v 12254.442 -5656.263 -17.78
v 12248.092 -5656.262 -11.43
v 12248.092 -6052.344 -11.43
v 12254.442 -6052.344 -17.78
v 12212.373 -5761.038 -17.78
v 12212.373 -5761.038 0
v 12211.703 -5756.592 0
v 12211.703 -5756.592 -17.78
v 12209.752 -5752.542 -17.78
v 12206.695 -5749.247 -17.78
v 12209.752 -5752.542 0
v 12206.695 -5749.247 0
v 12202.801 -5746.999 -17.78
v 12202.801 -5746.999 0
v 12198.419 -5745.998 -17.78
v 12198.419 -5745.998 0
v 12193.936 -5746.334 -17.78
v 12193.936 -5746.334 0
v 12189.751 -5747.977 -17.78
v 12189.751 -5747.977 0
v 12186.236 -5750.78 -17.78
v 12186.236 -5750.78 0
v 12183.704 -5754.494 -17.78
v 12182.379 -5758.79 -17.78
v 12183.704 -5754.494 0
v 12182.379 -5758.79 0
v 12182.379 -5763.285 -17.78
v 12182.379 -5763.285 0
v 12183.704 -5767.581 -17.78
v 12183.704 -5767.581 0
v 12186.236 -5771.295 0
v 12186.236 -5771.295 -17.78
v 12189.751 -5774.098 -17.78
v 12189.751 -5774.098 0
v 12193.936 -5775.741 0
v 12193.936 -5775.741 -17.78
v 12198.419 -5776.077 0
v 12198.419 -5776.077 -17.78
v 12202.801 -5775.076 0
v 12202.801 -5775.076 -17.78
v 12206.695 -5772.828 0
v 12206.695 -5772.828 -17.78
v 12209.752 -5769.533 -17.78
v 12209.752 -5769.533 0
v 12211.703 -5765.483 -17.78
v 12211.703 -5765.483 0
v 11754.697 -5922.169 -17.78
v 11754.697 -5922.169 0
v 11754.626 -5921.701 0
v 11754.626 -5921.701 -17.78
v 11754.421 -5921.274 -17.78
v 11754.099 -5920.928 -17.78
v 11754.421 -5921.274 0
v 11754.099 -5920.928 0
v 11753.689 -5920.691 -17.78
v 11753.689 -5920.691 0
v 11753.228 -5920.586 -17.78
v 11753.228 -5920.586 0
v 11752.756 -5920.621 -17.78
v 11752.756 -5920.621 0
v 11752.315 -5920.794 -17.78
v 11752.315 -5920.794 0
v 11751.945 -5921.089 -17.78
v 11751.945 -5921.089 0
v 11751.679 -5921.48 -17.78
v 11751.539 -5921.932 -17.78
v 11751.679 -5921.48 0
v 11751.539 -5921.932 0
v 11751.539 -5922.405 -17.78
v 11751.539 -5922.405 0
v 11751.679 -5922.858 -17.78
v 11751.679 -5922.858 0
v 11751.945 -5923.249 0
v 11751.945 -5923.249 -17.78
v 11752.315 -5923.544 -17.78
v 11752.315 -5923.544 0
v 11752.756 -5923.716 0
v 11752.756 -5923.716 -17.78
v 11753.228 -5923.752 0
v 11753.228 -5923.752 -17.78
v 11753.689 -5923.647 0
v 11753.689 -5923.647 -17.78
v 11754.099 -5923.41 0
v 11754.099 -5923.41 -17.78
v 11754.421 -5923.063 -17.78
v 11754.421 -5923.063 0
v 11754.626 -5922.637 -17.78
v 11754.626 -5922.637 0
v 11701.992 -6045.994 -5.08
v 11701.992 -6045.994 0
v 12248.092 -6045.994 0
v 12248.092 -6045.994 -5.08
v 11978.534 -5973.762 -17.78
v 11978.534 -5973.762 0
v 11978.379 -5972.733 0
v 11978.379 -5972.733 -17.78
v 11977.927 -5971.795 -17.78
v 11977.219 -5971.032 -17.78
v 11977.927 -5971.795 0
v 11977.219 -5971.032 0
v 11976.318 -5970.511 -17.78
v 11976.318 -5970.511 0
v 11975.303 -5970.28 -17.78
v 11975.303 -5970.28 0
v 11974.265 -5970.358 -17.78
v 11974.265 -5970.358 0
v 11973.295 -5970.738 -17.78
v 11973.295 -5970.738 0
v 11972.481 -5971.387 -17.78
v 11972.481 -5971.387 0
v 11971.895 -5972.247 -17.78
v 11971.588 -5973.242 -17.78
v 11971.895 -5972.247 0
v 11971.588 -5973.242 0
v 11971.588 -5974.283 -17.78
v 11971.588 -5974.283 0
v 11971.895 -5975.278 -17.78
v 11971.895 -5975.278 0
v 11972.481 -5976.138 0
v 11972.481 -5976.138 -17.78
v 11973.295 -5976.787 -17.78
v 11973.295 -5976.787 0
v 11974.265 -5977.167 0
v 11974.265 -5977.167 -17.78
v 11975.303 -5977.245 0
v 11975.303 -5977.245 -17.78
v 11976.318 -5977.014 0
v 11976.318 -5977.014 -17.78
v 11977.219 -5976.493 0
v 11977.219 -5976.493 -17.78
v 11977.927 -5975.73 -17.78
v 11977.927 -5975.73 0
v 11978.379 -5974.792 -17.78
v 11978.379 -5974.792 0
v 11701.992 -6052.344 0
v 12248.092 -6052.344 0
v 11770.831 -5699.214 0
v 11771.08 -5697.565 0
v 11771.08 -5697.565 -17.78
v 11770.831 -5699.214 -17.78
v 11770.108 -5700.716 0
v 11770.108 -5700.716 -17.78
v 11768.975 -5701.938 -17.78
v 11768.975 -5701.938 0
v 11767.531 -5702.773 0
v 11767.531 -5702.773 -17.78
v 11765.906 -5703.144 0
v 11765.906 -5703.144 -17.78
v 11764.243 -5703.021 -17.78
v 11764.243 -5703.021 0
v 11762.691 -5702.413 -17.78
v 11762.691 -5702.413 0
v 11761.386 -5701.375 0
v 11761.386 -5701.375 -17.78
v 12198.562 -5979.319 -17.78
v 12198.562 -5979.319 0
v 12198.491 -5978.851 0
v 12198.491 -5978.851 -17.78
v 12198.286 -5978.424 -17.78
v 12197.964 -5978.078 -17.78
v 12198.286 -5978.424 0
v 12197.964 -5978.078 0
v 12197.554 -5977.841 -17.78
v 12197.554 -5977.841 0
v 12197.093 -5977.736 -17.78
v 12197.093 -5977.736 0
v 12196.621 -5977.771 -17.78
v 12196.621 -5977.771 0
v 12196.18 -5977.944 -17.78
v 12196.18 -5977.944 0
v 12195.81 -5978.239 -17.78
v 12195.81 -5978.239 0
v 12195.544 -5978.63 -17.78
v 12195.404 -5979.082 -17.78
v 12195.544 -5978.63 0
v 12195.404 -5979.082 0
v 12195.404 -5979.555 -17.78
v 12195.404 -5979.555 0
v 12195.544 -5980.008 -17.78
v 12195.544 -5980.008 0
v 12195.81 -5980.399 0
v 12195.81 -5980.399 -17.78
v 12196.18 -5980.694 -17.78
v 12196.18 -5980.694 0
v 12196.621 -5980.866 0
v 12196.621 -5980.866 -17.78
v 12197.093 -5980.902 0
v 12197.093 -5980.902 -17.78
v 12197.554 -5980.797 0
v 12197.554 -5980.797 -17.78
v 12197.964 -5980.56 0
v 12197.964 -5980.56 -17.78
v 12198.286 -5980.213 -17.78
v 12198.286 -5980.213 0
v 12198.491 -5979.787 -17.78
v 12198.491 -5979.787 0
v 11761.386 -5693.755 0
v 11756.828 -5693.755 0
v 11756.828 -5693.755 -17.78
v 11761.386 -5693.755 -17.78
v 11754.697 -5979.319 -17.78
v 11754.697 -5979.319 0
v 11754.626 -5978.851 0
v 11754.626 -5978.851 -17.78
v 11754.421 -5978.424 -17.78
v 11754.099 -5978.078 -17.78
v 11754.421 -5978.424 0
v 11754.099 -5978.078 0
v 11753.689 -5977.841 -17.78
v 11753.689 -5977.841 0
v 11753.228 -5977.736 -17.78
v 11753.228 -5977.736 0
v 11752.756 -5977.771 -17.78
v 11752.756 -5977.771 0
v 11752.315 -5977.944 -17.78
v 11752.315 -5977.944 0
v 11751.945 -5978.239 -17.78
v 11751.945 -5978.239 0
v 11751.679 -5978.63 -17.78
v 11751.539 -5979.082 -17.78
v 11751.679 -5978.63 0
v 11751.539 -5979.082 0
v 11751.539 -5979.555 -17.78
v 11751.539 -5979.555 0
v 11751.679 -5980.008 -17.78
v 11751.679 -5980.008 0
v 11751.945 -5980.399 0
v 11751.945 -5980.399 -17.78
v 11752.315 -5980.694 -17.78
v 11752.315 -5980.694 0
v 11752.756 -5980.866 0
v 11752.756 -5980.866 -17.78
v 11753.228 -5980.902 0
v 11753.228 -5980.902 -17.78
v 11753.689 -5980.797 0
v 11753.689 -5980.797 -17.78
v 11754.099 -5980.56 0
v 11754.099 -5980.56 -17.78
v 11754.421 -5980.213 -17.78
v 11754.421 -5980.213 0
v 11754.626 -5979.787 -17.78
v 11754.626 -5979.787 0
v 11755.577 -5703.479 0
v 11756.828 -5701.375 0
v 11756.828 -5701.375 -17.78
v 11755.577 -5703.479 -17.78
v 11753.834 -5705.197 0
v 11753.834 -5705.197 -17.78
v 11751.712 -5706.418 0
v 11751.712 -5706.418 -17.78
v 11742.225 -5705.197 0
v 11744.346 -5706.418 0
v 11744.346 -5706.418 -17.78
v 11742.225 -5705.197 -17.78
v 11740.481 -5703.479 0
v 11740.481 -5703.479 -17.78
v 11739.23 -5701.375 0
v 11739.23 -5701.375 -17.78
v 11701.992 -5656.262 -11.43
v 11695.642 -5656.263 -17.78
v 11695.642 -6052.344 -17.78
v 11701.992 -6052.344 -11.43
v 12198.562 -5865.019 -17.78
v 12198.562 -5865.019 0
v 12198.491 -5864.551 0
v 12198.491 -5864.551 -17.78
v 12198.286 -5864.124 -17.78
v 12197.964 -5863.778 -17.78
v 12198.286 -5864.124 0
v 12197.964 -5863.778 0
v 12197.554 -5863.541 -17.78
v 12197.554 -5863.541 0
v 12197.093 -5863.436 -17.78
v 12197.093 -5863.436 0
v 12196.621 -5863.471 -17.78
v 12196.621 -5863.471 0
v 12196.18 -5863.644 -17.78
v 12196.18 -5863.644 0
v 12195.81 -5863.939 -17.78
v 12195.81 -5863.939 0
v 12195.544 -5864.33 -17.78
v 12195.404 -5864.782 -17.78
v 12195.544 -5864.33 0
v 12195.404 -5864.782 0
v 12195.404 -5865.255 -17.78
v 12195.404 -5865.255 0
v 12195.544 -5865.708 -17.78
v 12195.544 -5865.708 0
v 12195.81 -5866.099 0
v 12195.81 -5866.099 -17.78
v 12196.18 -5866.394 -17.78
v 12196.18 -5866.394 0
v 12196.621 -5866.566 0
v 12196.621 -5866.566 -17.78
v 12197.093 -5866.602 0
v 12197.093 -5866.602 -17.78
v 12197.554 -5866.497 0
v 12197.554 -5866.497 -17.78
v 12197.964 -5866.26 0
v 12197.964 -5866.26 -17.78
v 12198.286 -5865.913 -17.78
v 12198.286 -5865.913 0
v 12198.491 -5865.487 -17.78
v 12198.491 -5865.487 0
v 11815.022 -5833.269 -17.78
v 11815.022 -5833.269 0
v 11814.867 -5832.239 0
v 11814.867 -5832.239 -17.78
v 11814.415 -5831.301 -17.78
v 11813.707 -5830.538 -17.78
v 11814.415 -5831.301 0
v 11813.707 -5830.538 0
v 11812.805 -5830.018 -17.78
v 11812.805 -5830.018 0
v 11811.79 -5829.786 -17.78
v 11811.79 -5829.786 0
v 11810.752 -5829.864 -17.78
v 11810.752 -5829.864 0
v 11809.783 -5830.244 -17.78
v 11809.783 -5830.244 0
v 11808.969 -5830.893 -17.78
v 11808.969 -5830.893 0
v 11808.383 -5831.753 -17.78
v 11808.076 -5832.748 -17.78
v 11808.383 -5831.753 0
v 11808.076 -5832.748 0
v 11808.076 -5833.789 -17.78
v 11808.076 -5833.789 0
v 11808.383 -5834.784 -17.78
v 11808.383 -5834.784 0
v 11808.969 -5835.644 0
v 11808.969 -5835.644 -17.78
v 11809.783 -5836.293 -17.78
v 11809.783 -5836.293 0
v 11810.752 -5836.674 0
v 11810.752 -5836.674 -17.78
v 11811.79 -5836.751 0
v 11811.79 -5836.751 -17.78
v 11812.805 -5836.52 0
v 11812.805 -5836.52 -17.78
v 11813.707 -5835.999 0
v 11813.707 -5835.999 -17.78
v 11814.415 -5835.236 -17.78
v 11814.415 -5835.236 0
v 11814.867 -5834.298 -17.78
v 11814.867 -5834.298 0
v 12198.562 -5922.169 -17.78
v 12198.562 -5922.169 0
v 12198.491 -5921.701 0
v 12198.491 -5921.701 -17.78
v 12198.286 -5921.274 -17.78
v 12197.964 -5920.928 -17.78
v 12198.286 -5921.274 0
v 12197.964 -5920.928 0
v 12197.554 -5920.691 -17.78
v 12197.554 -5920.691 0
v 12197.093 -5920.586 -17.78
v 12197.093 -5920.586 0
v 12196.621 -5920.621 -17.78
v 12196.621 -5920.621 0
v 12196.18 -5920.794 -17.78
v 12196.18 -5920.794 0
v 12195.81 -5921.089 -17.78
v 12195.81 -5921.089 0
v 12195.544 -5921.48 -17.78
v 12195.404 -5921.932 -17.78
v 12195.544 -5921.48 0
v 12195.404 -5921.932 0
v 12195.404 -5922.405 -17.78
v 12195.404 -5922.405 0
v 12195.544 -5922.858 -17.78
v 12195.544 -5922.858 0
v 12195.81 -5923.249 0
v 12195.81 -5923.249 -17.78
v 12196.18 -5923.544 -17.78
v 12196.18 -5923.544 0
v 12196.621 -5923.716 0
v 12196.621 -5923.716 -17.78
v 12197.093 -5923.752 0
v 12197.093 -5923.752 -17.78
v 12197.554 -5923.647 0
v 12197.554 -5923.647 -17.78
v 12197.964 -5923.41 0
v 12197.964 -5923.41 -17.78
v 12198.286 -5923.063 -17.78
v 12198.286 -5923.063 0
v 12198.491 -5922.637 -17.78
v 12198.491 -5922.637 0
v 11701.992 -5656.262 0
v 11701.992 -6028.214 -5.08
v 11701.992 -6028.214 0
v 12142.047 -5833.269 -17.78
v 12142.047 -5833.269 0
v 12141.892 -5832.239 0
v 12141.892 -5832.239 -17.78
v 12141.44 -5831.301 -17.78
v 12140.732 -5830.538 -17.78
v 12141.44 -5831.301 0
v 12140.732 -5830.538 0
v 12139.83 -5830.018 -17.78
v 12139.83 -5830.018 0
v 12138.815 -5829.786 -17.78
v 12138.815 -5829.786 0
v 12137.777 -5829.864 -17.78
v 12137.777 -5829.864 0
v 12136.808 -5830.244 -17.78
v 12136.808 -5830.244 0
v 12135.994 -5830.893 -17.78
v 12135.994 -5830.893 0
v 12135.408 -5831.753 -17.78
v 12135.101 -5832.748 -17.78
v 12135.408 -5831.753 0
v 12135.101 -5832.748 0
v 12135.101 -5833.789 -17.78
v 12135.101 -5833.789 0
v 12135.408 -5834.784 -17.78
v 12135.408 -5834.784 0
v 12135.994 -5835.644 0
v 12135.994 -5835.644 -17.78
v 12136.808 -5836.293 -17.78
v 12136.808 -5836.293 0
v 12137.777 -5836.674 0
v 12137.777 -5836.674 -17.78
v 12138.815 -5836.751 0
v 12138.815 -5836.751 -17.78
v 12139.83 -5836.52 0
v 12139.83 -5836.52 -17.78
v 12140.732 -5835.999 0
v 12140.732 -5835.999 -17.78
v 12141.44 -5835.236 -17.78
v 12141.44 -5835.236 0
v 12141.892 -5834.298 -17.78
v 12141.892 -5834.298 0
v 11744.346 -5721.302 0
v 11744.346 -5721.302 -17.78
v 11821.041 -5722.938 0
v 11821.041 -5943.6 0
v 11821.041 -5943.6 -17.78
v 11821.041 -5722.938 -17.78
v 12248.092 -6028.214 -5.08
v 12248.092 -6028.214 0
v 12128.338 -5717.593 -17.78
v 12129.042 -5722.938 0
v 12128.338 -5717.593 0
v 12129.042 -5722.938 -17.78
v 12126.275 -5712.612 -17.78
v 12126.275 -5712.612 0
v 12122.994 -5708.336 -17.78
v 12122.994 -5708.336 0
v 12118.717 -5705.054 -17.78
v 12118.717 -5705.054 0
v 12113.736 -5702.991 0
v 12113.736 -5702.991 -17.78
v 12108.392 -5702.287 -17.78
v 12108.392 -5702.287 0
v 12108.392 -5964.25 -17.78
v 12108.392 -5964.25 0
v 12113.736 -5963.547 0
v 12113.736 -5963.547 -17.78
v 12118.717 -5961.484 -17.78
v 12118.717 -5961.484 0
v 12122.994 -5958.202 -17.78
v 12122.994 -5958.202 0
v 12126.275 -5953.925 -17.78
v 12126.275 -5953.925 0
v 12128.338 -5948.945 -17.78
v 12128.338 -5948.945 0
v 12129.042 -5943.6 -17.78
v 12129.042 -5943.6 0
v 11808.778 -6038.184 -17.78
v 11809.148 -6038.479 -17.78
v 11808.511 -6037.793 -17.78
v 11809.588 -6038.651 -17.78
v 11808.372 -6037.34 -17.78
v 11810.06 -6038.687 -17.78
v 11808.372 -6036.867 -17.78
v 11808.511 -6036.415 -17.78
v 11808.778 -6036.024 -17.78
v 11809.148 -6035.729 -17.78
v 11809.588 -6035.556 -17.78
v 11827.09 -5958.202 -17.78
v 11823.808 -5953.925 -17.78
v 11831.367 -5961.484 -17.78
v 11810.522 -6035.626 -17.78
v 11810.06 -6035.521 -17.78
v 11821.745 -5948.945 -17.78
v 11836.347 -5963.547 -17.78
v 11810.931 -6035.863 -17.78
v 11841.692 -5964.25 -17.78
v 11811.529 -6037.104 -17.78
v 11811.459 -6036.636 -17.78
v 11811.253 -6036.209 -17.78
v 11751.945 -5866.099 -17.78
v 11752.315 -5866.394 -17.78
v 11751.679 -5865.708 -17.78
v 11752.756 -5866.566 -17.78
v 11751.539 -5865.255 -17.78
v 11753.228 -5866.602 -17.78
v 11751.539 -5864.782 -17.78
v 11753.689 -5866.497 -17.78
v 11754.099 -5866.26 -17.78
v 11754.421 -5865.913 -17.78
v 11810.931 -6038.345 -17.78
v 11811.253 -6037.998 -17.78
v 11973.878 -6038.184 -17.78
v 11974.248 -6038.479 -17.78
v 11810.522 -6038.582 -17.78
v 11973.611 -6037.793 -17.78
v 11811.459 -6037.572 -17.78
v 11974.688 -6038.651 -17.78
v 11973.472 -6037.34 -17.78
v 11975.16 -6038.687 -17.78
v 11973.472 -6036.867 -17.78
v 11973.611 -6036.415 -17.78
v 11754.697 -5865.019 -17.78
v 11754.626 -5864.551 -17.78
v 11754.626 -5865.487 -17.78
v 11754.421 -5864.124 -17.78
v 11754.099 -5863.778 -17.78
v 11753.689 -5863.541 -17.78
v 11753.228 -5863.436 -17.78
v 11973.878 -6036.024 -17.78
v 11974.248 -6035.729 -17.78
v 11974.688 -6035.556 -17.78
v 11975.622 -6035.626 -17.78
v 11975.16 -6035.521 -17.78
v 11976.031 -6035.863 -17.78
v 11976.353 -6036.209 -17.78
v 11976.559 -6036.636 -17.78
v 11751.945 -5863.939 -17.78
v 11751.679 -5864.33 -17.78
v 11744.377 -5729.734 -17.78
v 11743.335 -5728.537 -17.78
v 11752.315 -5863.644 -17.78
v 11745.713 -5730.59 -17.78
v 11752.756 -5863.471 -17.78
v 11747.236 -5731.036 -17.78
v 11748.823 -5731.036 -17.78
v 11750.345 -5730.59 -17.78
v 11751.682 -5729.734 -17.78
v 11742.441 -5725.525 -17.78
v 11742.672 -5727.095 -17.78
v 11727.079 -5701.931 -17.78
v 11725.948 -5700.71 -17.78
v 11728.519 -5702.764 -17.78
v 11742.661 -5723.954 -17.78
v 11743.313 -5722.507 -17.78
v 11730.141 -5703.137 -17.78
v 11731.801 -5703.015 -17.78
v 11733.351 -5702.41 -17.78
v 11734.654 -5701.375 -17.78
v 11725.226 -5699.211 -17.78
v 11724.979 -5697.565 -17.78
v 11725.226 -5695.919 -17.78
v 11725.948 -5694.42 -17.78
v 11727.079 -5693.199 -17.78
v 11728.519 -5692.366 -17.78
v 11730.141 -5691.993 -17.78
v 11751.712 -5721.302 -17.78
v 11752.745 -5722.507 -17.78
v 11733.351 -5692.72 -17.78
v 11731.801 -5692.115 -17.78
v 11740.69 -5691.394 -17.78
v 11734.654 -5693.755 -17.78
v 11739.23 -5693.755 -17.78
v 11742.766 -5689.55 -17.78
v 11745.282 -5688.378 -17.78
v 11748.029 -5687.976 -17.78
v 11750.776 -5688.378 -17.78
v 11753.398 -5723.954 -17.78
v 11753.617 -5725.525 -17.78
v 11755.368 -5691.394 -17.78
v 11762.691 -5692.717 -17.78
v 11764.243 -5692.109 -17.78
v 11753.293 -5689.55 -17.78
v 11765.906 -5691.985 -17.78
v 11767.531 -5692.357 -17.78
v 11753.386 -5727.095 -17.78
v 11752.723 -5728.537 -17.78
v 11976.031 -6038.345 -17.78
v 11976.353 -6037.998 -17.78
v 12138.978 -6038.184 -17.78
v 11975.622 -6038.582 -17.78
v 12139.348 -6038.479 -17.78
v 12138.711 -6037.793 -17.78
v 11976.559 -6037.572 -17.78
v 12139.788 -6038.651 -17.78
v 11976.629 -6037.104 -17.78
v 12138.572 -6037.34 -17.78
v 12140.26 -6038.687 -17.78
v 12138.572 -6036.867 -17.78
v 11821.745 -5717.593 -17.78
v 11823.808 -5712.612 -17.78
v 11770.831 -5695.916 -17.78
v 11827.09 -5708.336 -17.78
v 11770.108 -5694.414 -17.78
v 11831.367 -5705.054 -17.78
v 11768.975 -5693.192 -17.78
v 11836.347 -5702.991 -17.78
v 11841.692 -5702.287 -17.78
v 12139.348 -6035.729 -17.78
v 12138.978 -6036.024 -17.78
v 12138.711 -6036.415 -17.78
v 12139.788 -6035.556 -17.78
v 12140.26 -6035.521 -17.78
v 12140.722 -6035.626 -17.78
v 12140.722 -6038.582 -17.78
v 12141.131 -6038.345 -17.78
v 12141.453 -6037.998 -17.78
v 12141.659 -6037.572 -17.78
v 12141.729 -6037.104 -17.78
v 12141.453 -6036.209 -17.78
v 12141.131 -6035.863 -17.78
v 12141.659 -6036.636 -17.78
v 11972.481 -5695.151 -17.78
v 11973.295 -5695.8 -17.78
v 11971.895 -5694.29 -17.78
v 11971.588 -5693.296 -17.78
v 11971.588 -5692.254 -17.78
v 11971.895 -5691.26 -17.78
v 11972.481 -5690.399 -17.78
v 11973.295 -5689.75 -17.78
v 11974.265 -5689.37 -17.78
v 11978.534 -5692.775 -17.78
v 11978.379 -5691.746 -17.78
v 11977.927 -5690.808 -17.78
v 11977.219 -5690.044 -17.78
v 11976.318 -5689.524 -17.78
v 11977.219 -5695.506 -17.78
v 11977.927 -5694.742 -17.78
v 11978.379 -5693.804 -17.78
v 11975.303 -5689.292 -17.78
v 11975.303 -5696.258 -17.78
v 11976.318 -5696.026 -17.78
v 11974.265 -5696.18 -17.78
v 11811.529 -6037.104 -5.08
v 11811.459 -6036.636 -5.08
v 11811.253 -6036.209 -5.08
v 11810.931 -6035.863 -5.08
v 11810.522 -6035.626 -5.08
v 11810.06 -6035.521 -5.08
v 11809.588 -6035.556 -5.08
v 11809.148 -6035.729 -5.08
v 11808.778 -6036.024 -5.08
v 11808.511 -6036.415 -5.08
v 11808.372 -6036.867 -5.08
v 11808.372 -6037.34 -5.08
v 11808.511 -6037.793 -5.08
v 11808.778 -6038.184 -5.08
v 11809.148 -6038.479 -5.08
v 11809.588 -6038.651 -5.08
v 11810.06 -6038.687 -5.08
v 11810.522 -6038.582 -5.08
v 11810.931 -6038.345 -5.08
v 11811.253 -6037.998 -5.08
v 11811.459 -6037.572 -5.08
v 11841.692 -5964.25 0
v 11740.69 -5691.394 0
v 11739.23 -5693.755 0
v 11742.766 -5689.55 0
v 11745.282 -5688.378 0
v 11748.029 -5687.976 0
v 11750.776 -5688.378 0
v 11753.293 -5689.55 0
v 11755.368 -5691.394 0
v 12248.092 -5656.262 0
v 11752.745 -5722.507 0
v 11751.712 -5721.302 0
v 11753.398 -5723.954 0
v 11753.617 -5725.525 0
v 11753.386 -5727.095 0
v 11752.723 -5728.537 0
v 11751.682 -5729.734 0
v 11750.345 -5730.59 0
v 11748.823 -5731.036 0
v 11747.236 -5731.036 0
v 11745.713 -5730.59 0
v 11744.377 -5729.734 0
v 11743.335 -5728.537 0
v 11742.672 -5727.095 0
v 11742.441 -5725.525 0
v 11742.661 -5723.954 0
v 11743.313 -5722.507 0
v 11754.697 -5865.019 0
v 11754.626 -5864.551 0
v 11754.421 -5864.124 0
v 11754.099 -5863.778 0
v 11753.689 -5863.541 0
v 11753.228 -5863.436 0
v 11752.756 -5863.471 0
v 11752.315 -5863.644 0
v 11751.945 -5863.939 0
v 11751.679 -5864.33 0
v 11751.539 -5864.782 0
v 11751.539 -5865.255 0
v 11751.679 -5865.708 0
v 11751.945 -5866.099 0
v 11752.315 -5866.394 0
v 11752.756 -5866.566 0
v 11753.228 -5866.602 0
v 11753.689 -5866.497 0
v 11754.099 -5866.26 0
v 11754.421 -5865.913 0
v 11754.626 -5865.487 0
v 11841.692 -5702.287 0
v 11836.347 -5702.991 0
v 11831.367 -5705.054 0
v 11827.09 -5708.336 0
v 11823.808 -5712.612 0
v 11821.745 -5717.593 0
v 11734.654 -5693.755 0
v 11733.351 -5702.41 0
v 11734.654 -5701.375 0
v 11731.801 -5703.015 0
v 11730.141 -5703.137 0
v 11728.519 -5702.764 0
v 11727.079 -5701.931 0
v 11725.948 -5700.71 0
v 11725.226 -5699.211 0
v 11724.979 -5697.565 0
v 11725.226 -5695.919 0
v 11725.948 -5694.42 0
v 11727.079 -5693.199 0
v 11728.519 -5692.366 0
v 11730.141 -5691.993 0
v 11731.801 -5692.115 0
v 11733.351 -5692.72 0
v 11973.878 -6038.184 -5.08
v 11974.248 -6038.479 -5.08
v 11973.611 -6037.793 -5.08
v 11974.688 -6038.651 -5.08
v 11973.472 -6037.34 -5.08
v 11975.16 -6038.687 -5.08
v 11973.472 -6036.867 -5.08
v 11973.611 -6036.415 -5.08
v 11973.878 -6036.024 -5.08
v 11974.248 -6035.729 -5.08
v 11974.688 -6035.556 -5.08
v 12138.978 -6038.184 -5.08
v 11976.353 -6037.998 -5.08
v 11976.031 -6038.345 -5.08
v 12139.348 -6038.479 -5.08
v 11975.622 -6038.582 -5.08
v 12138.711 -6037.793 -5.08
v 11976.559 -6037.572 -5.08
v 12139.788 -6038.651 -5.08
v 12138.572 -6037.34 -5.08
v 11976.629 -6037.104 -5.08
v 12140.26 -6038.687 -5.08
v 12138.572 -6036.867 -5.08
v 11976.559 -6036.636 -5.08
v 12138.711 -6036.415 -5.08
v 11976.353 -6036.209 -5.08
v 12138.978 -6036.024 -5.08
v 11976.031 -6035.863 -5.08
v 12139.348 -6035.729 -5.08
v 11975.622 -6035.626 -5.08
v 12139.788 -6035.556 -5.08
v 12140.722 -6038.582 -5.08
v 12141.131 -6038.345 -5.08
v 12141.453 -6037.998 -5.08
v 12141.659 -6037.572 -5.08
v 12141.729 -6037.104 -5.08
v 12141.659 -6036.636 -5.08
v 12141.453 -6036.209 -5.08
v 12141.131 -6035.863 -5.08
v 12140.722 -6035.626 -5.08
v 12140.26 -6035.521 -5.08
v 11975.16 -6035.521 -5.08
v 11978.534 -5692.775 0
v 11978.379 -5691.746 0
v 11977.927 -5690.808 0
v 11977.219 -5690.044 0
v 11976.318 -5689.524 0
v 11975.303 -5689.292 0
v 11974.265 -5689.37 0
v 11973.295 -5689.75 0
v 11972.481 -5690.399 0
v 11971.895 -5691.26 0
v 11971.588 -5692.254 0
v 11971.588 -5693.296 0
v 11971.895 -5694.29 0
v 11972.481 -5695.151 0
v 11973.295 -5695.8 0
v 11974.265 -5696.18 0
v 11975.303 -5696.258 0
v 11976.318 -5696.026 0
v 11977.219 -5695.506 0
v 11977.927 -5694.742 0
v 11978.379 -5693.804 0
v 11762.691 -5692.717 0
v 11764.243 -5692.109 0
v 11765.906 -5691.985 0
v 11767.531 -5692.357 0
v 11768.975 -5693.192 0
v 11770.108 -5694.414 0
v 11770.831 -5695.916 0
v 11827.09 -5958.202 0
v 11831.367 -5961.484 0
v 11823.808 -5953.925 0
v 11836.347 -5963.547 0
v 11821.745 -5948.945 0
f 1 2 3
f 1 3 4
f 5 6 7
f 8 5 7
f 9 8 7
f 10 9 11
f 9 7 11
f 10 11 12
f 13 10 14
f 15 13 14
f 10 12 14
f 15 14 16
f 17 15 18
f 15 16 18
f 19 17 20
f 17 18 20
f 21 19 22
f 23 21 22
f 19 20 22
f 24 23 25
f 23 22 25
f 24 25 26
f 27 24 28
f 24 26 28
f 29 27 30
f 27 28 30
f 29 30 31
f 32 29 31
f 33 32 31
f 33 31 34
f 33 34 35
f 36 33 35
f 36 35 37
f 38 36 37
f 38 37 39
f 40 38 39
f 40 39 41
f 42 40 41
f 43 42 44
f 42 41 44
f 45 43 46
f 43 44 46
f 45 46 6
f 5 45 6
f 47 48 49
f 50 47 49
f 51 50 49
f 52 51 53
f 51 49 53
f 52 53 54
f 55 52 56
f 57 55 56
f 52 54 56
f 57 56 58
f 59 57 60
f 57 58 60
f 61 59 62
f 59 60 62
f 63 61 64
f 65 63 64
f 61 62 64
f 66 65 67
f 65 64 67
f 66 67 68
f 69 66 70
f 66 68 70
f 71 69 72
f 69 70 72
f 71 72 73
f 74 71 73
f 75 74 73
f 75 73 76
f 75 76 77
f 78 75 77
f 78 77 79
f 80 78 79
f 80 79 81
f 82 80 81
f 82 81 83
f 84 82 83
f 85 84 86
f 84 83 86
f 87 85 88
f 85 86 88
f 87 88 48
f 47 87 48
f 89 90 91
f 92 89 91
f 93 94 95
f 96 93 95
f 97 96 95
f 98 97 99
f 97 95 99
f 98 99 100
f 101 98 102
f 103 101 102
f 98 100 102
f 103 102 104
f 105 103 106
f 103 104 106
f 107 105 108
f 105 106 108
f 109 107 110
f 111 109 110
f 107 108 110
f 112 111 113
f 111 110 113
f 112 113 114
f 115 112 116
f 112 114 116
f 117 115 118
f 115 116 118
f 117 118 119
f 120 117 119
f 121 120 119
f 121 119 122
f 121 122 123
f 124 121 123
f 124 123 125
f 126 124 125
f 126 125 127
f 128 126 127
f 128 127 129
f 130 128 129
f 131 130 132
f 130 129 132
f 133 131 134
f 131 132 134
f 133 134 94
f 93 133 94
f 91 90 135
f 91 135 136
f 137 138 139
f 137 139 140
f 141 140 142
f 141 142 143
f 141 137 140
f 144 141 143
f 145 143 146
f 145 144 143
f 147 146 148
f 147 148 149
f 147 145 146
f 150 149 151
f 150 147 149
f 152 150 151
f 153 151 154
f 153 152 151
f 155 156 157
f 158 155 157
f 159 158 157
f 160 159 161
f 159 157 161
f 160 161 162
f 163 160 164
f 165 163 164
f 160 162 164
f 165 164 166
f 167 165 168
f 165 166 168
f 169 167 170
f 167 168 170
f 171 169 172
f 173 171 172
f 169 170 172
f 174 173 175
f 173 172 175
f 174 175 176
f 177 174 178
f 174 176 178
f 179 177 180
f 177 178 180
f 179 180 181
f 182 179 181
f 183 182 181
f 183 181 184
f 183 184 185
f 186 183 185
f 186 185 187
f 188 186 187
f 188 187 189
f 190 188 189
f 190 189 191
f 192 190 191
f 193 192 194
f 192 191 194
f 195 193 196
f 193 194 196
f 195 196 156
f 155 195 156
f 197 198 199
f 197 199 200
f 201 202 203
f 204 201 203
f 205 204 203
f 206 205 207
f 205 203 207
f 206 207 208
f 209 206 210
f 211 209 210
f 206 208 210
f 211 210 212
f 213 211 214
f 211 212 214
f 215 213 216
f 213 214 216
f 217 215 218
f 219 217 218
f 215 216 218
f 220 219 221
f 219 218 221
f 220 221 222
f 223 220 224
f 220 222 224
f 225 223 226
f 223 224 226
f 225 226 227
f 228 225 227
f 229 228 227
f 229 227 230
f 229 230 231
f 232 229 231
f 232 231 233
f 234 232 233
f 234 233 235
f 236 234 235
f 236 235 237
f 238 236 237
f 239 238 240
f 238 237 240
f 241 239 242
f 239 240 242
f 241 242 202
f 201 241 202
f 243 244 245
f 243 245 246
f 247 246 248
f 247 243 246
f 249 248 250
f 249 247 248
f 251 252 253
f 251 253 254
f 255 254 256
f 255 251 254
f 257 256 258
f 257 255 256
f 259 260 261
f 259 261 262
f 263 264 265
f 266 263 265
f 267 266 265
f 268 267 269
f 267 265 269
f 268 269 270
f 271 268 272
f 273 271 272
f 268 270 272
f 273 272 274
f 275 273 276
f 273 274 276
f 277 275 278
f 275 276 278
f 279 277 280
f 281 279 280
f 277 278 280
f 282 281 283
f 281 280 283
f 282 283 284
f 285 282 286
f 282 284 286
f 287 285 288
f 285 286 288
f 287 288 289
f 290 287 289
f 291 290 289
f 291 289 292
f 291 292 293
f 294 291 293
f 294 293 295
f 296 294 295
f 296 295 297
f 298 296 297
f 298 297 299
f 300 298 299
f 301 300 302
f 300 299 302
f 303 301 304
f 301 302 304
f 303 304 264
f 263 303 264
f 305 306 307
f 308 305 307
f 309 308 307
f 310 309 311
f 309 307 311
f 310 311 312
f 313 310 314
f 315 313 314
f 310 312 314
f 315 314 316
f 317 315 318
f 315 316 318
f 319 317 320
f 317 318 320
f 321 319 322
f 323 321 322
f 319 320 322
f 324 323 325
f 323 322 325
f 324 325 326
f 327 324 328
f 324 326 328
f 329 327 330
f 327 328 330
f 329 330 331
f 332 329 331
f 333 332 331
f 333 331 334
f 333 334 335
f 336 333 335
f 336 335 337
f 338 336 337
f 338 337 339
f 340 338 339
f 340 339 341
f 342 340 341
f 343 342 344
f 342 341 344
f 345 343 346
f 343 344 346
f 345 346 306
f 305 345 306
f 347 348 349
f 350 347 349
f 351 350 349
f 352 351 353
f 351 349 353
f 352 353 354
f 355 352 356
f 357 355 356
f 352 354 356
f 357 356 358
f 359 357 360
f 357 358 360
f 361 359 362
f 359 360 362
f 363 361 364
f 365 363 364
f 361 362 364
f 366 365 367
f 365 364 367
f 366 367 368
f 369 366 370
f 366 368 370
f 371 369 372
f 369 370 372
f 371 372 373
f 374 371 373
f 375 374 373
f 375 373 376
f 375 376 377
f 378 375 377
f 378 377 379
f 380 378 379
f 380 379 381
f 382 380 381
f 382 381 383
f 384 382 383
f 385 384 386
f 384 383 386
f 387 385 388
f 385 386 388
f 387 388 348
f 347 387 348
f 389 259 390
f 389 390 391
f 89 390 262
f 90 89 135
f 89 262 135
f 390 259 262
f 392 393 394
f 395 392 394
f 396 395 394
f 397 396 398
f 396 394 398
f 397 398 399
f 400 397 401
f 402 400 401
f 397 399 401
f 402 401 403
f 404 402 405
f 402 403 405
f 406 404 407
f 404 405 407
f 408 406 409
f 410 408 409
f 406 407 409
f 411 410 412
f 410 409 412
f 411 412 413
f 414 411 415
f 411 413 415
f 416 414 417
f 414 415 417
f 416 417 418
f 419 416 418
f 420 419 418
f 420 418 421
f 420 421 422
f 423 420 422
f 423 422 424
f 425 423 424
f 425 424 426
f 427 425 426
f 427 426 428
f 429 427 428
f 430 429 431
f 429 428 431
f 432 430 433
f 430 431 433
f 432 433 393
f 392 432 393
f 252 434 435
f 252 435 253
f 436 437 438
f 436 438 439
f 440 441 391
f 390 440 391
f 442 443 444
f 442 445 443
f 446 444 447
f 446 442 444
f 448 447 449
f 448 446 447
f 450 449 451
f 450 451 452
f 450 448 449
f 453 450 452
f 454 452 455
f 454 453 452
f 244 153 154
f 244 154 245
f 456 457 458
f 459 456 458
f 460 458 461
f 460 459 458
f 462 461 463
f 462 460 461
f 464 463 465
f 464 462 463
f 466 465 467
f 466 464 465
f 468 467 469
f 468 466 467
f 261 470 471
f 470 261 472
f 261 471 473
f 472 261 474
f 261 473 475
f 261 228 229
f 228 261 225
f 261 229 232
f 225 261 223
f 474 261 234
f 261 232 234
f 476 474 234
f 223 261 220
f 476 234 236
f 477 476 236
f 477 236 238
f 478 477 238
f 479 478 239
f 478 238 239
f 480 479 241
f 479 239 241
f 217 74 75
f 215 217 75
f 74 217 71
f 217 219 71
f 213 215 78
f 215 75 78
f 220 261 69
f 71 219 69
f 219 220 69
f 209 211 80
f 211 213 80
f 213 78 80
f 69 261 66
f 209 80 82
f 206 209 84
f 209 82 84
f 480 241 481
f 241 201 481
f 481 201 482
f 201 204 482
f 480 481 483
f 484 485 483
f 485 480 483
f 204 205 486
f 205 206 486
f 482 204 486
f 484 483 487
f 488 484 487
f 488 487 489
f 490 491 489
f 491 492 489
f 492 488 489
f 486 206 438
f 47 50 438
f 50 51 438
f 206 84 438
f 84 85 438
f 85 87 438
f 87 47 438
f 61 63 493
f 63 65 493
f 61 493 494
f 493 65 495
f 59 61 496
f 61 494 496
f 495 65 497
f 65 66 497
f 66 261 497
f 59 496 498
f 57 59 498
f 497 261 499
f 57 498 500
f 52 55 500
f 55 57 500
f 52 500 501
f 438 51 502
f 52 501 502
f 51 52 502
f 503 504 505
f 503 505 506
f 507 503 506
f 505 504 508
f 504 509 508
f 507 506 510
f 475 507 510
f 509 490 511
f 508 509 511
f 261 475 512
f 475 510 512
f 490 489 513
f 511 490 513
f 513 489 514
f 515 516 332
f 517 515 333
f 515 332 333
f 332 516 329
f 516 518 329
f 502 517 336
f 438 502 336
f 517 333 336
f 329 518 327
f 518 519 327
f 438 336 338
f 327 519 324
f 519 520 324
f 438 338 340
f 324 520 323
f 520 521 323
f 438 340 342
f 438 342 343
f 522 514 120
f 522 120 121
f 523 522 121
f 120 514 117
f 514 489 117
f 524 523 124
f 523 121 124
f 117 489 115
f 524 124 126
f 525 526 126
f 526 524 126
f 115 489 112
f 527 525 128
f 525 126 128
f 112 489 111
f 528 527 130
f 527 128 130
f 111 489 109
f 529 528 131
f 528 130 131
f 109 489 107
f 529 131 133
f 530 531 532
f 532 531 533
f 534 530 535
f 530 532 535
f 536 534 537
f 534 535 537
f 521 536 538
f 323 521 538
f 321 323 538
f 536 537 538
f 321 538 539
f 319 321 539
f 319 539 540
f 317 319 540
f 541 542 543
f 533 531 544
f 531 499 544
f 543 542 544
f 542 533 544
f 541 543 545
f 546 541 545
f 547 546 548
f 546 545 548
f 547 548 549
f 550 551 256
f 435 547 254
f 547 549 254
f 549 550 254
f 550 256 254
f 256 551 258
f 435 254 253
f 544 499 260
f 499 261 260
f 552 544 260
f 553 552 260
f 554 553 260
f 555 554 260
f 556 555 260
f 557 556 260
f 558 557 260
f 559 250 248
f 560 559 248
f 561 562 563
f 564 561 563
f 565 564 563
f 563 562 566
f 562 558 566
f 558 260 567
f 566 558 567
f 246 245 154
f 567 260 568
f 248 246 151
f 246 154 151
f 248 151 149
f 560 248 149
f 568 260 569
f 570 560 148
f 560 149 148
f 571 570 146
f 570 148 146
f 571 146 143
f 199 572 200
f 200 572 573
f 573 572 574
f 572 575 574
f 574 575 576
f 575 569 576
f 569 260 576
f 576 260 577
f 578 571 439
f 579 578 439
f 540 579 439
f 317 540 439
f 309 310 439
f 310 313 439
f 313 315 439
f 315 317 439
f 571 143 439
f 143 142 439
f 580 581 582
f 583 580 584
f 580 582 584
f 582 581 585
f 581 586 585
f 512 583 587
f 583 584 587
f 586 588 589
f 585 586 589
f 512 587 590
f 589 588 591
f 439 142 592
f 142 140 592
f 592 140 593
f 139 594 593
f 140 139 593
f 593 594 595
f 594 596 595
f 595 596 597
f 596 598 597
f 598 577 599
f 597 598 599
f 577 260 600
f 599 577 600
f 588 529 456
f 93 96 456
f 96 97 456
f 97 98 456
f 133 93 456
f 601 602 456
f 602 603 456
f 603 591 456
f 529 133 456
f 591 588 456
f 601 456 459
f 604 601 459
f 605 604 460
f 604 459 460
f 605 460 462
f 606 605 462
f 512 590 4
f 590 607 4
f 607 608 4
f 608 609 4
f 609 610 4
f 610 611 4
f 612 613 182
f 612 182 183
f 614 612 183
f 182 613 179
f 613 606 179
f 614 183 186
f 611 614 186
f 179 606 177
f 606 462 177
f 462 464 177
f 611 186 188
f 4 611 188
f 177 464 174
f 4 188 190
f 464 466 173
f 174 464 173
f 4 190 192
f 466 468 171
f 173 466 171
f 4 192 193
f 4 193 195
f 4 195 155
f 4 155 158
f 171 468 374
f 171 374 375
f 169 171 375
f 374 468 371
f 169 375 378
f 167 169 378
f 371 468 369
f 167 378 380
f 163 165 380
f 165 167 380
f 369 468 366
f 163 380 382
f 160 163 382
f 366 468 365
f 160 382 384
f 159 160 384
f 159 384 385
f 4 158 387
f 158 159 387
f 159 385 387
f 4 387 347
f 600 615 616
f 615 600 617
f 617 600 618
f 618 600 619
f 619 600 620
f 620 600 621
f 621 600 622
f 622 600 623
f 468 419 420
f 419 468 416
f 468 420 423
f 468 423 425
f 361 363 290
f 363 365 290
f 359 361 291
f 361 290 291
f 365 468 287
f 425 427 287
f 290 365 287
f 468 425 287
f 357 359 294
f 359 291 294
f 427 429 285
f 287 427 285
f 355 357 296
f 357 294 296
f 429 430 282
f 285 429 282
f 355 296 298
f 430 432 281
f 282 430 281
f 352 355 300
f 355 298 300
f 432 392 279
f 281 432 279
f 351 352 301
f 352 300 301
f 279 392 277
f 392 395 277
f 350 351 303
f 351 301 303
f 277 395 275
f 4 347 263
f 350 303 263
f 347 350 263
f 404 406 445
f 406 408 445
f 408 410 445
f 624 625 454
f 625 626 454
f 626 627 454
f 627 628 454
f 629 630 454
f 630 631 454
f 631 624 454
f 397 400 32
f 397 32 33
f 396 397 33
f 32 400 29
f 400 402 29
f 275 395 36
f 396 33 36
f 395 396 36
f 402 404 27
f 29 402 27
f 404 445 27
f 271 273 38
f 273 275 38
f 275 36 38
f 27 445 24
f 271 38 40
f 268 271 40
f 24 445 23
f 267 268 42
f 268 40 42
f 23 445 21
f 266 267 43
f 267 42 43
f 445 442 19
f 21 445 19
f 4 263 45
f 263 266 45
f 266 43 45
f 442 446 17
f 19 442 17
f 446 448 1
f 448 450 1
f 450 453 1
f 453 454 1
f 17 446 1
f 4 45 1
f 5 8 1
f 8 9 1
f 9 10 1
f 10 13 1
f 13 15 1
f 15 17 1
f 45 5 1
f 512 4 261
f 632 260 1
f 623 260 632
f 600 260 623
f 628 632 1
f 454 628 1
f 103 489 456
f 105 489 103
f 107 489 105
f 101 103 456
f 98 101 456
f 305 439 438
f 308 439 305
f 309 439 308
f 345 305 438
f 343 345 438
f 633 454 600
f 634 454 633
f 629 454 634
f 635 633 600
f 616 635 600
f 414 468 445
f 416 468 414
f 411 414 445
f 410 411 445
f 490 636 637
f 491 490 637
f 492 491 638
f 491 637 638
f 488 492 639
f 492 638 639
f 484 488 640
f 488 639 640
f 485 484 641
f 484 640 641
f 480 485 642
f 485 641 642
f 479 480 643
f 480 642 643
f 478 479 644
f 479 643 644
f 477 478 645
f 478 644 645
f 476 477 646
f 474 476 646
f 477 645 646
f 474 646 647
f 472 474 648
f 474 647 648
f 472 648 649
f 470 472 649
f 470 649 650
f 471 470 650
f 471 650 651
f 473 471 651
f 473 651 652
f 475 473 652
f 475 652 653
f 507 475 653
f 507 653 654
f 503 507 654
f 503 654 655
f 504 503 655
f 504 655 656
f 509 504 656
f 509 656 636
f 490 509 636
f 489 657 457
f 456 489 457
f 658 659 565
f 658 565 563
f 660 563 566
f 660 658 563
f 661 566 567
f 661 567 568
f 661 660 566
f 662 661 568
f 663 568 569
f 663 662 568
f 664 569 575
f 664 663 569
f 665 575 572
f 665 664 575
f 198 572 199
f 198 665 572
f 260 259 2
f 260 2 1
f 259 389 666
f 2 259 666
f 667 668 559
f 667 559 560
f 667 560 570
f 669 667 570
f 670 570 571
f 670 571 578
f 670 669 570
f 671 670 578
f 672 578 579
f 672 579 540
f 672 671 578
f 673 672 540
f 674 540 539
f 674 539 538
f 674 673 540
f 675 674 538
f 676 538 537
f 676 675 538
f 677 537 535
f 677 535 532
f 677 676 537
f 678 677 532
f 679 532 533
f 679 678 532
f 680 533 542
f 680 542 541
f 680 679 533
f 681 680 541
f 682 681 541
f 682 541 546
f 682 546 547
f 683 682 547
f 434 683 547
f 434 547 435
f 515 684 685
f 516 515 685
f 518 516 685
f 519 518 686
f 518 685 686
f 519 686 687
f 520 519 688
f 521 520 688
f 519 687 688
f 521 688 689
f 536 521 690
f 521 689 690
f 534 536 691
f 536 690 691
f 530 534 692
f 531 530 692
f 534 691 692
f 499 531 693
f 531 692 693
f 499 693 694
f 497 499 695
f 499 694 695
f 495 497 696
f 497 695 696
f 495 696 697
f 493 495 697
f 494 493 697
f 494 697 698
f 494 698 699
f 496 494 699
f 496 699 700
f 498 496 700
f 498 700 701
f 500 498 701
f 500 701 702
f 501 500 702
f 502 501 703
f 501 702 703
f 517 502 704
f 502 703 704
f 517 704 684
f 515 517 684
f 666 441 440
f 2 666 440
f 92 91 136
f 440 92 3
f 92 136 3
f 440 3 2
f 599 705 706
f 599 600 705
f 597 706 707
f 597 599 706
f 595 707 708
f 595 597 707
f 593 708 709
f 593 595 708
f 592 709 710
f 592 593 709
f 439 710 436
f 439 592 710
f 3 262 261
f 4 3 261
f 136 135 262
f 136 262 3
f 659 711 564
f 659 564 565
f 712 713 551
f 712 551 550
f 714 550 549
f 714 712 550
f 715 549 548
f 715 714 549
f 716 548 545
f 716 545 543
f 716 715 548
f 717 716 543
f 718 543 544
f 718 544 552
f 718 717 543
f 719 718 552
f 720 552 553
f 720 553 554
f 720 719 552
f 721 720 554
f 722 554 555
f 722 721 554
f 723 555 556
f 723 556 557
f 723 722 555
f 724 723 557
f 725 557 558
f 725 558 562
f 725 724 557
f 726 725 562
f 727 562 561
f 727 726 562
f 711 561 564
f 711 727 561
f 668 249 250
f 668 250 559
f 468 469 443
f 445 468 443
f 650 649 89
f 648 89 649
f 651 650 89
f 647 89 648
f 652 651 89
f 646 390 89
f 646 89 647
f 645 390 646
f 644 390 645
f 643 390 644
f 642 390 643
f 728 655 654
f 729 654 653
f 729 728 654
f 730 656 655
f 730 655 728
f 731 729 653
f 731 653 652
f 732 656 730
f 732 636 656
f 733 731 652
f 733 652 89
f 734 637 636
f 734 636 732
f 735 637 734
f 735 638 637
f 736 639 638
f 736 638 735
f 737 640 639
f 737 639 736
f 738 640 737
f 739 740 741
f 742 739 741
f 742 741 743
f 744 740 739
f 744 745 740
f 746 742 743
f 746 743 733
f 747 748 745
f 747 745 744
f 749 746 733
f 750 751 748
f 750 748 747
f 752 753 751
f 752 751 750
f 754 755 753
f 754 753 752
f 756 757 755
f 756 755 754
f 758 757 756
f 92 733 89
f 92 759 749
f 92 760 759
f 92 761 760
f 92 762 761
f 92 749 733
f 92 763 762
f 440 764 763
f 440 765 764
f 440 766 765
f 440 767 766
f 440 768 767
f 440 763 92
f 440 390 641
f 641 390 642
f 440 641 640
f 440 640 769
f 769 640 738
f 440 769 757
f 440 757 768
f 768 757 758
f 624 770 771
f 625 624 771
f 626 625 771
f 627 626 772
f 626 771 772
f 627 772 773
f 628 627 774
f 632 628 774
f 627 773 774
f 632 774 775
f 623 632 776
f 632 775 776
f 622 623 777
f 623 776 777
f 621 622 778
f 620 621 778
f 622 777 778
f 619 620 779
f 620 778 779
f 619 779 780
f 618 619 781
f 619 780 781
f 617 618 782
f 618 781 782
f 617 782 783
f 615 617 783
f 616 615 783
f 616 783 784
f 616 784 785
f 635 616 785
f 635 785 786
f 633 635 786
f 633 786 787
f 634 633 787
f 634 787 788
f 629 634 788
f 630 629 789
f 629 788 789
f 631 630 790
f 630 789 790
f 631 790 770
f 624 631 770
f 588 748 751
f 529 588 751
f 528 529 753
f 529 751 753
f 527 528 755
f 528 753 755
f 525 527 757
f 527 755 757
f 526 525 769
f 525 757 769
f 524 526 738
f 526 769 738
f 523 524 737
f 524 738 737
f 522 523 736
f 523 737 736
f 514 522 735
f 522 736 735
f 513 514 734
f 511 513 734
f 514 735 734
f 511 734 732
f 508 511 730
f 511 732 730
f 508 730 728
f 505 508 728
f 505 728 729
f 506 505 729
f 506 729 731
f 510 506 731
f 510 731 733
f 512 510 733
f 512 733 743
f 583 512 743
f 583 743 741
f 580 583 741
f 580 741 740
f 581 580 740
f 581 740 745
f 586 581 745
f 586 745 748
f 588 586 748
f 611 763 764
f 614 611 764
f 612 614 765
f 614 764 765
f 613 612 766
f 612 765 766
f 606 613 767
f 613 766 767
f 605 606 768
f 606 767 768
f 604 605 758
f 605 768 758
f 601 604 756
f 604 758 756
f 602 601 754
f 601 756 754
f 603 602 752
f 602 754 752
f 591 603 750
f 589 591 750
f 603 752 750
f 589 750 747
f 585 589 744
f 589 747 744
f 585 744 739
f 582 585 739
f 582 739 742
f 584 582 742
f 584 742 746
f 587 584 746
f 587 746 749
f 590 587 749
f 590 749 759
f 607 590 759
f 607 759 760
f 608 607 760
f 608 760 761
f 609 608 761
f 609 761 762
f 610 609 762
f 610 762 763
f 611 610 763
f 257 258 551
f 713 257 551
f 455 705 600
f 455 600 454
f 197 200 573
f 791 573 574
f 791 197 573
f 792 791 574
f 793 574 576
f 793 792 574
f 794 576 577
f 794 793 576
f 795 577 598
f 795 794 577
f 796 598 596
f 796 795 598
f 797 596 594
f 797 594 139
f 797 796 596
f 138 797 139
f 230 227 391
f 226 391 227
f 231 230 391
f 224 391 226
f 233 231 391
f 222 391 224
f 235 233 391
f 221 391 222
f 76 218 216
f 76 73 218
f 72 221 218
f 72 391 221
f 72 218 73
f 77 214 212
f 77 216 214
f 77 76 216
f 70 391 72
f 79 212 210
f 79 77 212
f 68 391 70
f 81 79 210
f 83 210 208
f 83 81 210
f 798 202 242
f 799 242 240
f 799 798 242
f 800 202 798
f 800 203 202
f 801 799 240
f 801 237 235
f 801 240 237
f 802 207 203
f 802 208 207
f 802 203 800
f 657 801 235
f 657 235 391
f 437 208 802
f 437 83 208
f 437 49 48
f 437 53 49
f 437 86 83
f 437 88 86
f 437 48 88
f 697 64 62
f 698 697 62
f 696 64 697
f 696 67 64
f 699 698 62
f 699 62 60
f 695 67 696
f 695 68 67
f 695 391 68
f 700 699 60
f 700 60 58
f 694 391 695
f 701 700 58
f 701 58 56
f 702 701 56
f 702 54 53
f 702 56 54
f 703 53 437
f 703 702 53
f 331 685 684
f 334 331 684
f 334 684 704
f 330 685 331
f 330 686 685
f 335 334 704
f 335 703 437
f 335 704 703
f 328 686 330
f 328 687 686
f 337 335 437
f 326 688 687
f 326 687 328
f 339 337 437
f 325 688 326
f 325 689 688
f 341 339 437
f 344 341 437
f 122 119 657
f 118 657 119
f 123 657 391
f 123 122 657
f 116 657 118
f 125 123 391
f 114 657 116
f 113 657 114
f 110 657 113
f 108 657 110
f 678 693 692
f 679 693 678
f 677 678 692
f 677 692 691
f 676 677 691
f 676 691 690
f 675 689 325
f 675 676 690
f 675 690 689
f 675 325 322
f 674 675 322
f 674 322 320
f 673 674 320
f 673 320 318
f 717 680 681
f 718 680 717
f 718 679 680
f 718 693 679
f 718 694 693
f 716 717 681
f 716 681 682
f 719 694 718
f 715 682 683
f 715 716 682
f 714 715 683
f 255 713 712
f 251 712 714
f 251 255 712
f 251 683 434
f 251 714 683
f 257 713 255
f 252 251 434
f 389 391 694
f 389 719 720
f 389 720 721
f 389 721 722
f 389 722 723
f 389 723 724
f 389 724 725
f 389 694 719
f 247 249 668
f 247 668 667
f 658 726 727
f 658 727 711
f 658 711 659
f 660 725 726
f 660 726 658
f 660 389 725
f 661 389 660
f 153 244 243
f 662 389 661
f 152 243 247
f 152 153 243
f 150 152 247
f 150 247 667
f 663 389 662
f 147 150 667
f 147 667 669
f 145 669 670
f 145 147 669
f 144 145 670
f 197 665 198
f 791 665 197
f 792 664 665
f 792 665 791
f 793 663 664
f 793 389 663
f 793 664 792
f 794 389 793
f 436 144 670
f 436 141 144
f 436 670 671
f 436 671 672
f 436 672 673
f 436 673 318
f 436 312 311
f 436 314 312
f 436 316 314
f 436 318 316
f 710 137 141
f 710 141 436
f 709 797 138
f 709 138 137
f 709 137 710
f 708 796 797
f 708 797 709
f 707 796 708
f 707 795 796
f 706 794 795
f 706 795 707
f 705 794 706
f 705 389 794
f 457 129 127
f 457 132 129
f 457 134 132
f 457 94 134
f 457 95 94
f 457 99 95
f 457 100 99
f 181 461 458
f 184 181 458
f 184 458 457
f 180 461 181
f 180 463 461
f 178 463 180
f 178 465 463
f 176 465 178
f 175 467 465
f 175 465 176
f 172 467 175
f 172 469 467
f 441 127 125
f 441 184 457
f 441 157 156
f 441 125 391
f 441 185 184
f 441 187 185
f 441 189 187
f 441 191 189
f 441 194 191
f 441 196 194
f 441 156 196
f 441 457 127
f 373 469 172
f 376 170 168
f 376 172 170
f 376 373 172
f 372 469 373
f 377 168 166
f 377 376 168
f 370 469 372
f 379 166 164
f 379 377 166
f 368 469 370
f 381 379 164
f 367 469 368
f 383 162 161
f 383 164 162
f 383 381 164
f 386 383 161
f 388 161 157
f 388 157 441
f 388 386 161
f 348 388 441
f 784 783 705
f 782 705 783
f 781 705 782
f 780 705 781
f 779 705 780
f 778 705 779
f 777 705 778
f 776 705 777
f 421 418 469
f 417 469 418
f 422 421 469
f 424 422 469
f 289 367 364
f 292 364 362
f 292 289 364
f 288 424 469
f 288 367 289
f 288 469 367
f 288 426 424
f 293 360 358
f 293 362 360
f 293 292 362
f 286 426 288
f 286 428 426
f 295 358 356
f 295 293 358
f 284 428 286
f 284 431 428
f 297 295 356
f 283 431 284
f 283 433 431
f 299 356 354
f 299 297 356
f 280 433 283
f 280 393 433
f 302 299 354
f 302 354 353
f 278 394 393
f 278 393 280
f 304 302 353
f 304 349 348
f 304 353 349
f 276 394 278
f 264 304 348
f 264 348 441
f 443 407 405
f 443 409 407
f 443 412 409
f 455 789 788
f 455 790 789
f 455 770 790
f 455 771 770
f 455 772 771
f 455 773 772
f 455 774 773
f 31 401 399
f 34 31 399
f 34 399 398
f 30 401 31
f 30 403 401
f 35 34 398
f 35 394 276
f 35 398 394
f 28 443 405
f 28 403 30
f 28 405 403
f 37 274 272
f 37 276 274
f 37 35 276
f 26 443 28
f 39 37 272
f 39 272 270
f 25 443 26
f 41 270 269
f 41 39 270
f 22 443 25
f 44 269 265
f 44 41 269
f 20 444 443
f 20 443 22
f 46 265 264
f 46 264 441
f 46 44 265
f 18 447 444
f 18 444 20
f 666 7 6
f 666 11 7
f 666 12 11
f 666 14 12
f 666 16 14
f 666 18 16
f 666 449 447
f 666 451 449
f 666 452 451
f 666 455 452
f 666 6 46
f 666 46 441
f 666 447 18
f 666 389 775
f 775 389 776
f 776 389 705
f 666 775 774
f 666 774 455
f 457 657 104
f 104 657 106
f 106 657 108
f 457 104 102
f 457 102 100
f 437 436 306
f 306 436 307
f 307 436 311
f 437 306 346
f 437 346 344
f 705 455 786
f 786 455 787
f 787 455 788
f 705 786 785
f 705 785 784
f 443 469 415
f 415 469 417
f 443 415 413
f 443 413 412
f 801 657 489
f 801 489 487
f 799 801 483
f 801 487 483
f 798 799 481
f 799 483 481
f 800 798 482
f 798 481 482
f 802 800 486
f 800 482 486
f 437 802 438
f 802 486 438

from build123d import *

# Parameters (mm, degrees)
SKETCH2_W          = 558.8
SKETCH2_H          = 396.08125
EXTRUDE1_DEPTH     = 17.78
SKETCH3_R          = 15.08125
SKETCH3_R_2        = 3.4925
SKETCH3_R_3        = 1.5875
SKETCH3_W          = 308.0004
SKETCH3_H          = 261.9629
CUT_EXTRUDE1_DEPTH = 17.78
CUT_EXTRUDE2_DEPTH = 5.08
CUT_EXTRUDE4_DEPTH = 396.08125
FILLET1_R          = 20.6502


with BuildPart() as part:
    # Sketch2 → Extrude1 (new body)
    with BuildSketch(Plane.XY):
        with Locations((11975.041666666, -5854.303125)):
            Rectangle(SKETCH2_W, SKETCH2_H)
    extrude(amount=-EXTRUDE1_DEPTH)

    # Sketch3 → Cut-Extrude1 (cut)
    with BuildSketch(Plane.XY):
        with Locations((12197.291666666, -5761.0375)):
            Circle(SKETCH3_R)
        with Locations((12138.554166666, -5833.26875)):
            Circle(SKETCH3_R_2)
        with Locations((12196.974166666, -5865.01875)):
            Circle(SKETCH3_R_3)
        with Locations((12196.974166666, -5922.16875)):
            Circle(SKETCH3_R_3)
        with Locations((12196.974166666, -5979.31875)):
            Circle(SKETCH3_R_3)
        with Locations((12140.141666666, -6037.10375)):
            Circle(SKETCH3_R_3)
        with Locations((11975.041666666, -6037.10375)):
            Circle(SKETCH3_R_3)
        with Locations((11809.941666666, -6037.10375)):
            Circle(SKETCH3_R_3)
        with Locations((11753.109166666, -5979.31875)):
            Circle(SKETCH3_R_3)
        with Locations((11753.109166666, -5922.16875)):
            Circle(SKETCH3_R_3)
        with Locations((11753.109166666, -5865.01875)):
            Circle(SKETCH3_R_3)
        with Locations((11811.529166666, -5833.26875)):
            Circle(SKETCH3_R_2)
        with Locations((11975.041666666, -5973.7625)):
            Circle(SKETCH3_R_2)
        with Locations((11975.041666666, -5692.775)):
            Circle(SKETCH3_R_2)
        with Locations((11975.041666666, -5833.26875)):
            Rectangle(SKETCH3_W, SKETCH3_H)
        with BuildLine():
            Line((11734.654409808, -5693.754968556), (11739.23011943, -5693.754968556))
            ThreePointArc((11739.23011943, -5693.754968556), (11748.029166666, -5687.976468556), (11756.828213901, -5693.754968556))
            Line((11756.828213901, -5693.754968556), (11761.386355753, -5693.754968556))
            ThreePointArc((11761.386355753, -5693.754968556), (11767.531113043, -5692.357368906), (11771.079666666, -5697.564968556))
            ThreePointArc((11771.079666666, -5697.564968556), (11767.531113043, -5702.772568206), (11761.386355753, -5701.374968556))
            Line((11761.386355753, -5701.374968556), (11756.828213901, -5701.374968556))
            ThreePointArc((11756.828213901, -5701.374968556), (11754.760305425, -5704.393665595), (11751.712166666, -5706.417925308))
            Line((11751.712166666, -5706.417925308), (11751.712166666, -5721.30243896))
            ThreePointArc((11751.712166666, -5721.30243896), (11748.029166666, -5731.092968556), (11744.346166666, -5721.30243896))
            Line((11744.346166666, -5721.30243896), (11744.346166666, -5706.417925308))
            ThreePointArc((11744.346166666, -5706.417925308), (11741.298027907, -5704.393665595), (11739.23011943, -5701.374968556))
            Line((11739.23011943, -5701.374968556), (11734.654409809, -5701.374968556))
            ThreePointArc((11734.654409809, -5701.374968556), (11724.978666666, -5697.564968556), (11734.654409808, -5693.754968556))
        make_face()
    extrude(amount=-CUT_EXTRUDE1_DEPTH, mode=Mode.SUBTRACT)

    # Sketch4 → Cut-Extrude2 (cut)
    with BuildSketch(Plane.XY):
        Polygon((11975.041666666, -6028.21375), (11695.641666666, -6028.21375), (11695.641666666, -6045.99375), (12254.441666666, -6045.99375), (12254.441666666, -6028.21375), align=None)
    extrude(amount=-CUT_EXTRUDE2_DEPTH, mode=Mode.SUBTRACT)

    # Sketch7 → Cut-Extrude4 (cut)
    with BuildSketch(Plane.XZ.offset(6052.34375)):
        Polygon((11701.991666666, -11.43), (11701.991666666, 0), (11695.641666666, 0), (11695.641666666, -17.78), align=None)
        Polygon((12248.091666666, -11.43), (12254.441666666, -17.78), (12254.441666666, 0), (12248.091666666, 0), align=None)
    extrude(amount=-CUT_EXTRUDE4_DEPTH, mode=Mode.SUBTRACT)

    # Fillet1
    fillet1_edges = [part.edges().sort_by_distance(p)[0] for p in [
        (11821.041466666, -5964.2502, -8.89),
        (11821.041466666, -5702.2873, -8.89),
        (12129.041866666, -5702.2873, -8.89),
        (12129.041866666, -5964.2502, -8.89),
    ]]
    fillet(fillet1_edges, radius=FILLET1_R)


solid = part.part
